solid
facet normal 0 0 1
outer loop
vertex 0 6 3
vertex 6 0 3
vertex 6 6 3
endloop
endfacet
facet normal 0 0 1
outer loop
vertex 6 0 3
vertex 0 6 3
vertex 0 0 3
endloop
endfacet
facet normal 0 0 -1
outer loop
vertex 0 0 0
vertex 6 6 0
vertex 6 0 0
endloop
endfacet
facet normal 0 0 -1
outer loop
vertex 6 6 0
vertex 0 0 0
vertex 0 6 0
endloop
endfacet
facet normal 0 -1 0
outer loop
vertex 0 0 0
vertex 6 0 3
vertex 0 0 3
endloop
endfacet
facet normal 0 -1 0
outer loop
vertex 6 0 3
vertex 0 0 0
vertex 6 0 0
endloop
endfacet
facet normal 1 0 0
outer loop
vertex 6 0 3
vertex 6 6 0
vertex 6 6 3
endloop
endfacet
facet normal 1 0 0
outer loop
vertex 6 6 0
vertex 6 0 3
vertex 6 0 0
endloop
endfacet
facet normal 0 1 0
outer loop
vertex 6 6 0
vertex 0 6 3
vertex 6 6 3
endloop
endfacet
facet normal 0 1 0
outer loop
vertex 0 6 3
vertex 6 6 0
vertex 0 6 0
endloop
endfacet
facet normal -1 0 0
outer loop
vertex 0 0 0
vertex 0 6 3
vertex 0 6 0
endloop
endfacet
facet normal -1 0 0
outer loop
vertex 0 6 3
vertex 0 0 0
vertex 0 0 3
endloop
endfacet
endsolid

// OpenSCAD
union() {
  translate([0, 0, 0]) cube(size=[6,6,3], center=false);
}
